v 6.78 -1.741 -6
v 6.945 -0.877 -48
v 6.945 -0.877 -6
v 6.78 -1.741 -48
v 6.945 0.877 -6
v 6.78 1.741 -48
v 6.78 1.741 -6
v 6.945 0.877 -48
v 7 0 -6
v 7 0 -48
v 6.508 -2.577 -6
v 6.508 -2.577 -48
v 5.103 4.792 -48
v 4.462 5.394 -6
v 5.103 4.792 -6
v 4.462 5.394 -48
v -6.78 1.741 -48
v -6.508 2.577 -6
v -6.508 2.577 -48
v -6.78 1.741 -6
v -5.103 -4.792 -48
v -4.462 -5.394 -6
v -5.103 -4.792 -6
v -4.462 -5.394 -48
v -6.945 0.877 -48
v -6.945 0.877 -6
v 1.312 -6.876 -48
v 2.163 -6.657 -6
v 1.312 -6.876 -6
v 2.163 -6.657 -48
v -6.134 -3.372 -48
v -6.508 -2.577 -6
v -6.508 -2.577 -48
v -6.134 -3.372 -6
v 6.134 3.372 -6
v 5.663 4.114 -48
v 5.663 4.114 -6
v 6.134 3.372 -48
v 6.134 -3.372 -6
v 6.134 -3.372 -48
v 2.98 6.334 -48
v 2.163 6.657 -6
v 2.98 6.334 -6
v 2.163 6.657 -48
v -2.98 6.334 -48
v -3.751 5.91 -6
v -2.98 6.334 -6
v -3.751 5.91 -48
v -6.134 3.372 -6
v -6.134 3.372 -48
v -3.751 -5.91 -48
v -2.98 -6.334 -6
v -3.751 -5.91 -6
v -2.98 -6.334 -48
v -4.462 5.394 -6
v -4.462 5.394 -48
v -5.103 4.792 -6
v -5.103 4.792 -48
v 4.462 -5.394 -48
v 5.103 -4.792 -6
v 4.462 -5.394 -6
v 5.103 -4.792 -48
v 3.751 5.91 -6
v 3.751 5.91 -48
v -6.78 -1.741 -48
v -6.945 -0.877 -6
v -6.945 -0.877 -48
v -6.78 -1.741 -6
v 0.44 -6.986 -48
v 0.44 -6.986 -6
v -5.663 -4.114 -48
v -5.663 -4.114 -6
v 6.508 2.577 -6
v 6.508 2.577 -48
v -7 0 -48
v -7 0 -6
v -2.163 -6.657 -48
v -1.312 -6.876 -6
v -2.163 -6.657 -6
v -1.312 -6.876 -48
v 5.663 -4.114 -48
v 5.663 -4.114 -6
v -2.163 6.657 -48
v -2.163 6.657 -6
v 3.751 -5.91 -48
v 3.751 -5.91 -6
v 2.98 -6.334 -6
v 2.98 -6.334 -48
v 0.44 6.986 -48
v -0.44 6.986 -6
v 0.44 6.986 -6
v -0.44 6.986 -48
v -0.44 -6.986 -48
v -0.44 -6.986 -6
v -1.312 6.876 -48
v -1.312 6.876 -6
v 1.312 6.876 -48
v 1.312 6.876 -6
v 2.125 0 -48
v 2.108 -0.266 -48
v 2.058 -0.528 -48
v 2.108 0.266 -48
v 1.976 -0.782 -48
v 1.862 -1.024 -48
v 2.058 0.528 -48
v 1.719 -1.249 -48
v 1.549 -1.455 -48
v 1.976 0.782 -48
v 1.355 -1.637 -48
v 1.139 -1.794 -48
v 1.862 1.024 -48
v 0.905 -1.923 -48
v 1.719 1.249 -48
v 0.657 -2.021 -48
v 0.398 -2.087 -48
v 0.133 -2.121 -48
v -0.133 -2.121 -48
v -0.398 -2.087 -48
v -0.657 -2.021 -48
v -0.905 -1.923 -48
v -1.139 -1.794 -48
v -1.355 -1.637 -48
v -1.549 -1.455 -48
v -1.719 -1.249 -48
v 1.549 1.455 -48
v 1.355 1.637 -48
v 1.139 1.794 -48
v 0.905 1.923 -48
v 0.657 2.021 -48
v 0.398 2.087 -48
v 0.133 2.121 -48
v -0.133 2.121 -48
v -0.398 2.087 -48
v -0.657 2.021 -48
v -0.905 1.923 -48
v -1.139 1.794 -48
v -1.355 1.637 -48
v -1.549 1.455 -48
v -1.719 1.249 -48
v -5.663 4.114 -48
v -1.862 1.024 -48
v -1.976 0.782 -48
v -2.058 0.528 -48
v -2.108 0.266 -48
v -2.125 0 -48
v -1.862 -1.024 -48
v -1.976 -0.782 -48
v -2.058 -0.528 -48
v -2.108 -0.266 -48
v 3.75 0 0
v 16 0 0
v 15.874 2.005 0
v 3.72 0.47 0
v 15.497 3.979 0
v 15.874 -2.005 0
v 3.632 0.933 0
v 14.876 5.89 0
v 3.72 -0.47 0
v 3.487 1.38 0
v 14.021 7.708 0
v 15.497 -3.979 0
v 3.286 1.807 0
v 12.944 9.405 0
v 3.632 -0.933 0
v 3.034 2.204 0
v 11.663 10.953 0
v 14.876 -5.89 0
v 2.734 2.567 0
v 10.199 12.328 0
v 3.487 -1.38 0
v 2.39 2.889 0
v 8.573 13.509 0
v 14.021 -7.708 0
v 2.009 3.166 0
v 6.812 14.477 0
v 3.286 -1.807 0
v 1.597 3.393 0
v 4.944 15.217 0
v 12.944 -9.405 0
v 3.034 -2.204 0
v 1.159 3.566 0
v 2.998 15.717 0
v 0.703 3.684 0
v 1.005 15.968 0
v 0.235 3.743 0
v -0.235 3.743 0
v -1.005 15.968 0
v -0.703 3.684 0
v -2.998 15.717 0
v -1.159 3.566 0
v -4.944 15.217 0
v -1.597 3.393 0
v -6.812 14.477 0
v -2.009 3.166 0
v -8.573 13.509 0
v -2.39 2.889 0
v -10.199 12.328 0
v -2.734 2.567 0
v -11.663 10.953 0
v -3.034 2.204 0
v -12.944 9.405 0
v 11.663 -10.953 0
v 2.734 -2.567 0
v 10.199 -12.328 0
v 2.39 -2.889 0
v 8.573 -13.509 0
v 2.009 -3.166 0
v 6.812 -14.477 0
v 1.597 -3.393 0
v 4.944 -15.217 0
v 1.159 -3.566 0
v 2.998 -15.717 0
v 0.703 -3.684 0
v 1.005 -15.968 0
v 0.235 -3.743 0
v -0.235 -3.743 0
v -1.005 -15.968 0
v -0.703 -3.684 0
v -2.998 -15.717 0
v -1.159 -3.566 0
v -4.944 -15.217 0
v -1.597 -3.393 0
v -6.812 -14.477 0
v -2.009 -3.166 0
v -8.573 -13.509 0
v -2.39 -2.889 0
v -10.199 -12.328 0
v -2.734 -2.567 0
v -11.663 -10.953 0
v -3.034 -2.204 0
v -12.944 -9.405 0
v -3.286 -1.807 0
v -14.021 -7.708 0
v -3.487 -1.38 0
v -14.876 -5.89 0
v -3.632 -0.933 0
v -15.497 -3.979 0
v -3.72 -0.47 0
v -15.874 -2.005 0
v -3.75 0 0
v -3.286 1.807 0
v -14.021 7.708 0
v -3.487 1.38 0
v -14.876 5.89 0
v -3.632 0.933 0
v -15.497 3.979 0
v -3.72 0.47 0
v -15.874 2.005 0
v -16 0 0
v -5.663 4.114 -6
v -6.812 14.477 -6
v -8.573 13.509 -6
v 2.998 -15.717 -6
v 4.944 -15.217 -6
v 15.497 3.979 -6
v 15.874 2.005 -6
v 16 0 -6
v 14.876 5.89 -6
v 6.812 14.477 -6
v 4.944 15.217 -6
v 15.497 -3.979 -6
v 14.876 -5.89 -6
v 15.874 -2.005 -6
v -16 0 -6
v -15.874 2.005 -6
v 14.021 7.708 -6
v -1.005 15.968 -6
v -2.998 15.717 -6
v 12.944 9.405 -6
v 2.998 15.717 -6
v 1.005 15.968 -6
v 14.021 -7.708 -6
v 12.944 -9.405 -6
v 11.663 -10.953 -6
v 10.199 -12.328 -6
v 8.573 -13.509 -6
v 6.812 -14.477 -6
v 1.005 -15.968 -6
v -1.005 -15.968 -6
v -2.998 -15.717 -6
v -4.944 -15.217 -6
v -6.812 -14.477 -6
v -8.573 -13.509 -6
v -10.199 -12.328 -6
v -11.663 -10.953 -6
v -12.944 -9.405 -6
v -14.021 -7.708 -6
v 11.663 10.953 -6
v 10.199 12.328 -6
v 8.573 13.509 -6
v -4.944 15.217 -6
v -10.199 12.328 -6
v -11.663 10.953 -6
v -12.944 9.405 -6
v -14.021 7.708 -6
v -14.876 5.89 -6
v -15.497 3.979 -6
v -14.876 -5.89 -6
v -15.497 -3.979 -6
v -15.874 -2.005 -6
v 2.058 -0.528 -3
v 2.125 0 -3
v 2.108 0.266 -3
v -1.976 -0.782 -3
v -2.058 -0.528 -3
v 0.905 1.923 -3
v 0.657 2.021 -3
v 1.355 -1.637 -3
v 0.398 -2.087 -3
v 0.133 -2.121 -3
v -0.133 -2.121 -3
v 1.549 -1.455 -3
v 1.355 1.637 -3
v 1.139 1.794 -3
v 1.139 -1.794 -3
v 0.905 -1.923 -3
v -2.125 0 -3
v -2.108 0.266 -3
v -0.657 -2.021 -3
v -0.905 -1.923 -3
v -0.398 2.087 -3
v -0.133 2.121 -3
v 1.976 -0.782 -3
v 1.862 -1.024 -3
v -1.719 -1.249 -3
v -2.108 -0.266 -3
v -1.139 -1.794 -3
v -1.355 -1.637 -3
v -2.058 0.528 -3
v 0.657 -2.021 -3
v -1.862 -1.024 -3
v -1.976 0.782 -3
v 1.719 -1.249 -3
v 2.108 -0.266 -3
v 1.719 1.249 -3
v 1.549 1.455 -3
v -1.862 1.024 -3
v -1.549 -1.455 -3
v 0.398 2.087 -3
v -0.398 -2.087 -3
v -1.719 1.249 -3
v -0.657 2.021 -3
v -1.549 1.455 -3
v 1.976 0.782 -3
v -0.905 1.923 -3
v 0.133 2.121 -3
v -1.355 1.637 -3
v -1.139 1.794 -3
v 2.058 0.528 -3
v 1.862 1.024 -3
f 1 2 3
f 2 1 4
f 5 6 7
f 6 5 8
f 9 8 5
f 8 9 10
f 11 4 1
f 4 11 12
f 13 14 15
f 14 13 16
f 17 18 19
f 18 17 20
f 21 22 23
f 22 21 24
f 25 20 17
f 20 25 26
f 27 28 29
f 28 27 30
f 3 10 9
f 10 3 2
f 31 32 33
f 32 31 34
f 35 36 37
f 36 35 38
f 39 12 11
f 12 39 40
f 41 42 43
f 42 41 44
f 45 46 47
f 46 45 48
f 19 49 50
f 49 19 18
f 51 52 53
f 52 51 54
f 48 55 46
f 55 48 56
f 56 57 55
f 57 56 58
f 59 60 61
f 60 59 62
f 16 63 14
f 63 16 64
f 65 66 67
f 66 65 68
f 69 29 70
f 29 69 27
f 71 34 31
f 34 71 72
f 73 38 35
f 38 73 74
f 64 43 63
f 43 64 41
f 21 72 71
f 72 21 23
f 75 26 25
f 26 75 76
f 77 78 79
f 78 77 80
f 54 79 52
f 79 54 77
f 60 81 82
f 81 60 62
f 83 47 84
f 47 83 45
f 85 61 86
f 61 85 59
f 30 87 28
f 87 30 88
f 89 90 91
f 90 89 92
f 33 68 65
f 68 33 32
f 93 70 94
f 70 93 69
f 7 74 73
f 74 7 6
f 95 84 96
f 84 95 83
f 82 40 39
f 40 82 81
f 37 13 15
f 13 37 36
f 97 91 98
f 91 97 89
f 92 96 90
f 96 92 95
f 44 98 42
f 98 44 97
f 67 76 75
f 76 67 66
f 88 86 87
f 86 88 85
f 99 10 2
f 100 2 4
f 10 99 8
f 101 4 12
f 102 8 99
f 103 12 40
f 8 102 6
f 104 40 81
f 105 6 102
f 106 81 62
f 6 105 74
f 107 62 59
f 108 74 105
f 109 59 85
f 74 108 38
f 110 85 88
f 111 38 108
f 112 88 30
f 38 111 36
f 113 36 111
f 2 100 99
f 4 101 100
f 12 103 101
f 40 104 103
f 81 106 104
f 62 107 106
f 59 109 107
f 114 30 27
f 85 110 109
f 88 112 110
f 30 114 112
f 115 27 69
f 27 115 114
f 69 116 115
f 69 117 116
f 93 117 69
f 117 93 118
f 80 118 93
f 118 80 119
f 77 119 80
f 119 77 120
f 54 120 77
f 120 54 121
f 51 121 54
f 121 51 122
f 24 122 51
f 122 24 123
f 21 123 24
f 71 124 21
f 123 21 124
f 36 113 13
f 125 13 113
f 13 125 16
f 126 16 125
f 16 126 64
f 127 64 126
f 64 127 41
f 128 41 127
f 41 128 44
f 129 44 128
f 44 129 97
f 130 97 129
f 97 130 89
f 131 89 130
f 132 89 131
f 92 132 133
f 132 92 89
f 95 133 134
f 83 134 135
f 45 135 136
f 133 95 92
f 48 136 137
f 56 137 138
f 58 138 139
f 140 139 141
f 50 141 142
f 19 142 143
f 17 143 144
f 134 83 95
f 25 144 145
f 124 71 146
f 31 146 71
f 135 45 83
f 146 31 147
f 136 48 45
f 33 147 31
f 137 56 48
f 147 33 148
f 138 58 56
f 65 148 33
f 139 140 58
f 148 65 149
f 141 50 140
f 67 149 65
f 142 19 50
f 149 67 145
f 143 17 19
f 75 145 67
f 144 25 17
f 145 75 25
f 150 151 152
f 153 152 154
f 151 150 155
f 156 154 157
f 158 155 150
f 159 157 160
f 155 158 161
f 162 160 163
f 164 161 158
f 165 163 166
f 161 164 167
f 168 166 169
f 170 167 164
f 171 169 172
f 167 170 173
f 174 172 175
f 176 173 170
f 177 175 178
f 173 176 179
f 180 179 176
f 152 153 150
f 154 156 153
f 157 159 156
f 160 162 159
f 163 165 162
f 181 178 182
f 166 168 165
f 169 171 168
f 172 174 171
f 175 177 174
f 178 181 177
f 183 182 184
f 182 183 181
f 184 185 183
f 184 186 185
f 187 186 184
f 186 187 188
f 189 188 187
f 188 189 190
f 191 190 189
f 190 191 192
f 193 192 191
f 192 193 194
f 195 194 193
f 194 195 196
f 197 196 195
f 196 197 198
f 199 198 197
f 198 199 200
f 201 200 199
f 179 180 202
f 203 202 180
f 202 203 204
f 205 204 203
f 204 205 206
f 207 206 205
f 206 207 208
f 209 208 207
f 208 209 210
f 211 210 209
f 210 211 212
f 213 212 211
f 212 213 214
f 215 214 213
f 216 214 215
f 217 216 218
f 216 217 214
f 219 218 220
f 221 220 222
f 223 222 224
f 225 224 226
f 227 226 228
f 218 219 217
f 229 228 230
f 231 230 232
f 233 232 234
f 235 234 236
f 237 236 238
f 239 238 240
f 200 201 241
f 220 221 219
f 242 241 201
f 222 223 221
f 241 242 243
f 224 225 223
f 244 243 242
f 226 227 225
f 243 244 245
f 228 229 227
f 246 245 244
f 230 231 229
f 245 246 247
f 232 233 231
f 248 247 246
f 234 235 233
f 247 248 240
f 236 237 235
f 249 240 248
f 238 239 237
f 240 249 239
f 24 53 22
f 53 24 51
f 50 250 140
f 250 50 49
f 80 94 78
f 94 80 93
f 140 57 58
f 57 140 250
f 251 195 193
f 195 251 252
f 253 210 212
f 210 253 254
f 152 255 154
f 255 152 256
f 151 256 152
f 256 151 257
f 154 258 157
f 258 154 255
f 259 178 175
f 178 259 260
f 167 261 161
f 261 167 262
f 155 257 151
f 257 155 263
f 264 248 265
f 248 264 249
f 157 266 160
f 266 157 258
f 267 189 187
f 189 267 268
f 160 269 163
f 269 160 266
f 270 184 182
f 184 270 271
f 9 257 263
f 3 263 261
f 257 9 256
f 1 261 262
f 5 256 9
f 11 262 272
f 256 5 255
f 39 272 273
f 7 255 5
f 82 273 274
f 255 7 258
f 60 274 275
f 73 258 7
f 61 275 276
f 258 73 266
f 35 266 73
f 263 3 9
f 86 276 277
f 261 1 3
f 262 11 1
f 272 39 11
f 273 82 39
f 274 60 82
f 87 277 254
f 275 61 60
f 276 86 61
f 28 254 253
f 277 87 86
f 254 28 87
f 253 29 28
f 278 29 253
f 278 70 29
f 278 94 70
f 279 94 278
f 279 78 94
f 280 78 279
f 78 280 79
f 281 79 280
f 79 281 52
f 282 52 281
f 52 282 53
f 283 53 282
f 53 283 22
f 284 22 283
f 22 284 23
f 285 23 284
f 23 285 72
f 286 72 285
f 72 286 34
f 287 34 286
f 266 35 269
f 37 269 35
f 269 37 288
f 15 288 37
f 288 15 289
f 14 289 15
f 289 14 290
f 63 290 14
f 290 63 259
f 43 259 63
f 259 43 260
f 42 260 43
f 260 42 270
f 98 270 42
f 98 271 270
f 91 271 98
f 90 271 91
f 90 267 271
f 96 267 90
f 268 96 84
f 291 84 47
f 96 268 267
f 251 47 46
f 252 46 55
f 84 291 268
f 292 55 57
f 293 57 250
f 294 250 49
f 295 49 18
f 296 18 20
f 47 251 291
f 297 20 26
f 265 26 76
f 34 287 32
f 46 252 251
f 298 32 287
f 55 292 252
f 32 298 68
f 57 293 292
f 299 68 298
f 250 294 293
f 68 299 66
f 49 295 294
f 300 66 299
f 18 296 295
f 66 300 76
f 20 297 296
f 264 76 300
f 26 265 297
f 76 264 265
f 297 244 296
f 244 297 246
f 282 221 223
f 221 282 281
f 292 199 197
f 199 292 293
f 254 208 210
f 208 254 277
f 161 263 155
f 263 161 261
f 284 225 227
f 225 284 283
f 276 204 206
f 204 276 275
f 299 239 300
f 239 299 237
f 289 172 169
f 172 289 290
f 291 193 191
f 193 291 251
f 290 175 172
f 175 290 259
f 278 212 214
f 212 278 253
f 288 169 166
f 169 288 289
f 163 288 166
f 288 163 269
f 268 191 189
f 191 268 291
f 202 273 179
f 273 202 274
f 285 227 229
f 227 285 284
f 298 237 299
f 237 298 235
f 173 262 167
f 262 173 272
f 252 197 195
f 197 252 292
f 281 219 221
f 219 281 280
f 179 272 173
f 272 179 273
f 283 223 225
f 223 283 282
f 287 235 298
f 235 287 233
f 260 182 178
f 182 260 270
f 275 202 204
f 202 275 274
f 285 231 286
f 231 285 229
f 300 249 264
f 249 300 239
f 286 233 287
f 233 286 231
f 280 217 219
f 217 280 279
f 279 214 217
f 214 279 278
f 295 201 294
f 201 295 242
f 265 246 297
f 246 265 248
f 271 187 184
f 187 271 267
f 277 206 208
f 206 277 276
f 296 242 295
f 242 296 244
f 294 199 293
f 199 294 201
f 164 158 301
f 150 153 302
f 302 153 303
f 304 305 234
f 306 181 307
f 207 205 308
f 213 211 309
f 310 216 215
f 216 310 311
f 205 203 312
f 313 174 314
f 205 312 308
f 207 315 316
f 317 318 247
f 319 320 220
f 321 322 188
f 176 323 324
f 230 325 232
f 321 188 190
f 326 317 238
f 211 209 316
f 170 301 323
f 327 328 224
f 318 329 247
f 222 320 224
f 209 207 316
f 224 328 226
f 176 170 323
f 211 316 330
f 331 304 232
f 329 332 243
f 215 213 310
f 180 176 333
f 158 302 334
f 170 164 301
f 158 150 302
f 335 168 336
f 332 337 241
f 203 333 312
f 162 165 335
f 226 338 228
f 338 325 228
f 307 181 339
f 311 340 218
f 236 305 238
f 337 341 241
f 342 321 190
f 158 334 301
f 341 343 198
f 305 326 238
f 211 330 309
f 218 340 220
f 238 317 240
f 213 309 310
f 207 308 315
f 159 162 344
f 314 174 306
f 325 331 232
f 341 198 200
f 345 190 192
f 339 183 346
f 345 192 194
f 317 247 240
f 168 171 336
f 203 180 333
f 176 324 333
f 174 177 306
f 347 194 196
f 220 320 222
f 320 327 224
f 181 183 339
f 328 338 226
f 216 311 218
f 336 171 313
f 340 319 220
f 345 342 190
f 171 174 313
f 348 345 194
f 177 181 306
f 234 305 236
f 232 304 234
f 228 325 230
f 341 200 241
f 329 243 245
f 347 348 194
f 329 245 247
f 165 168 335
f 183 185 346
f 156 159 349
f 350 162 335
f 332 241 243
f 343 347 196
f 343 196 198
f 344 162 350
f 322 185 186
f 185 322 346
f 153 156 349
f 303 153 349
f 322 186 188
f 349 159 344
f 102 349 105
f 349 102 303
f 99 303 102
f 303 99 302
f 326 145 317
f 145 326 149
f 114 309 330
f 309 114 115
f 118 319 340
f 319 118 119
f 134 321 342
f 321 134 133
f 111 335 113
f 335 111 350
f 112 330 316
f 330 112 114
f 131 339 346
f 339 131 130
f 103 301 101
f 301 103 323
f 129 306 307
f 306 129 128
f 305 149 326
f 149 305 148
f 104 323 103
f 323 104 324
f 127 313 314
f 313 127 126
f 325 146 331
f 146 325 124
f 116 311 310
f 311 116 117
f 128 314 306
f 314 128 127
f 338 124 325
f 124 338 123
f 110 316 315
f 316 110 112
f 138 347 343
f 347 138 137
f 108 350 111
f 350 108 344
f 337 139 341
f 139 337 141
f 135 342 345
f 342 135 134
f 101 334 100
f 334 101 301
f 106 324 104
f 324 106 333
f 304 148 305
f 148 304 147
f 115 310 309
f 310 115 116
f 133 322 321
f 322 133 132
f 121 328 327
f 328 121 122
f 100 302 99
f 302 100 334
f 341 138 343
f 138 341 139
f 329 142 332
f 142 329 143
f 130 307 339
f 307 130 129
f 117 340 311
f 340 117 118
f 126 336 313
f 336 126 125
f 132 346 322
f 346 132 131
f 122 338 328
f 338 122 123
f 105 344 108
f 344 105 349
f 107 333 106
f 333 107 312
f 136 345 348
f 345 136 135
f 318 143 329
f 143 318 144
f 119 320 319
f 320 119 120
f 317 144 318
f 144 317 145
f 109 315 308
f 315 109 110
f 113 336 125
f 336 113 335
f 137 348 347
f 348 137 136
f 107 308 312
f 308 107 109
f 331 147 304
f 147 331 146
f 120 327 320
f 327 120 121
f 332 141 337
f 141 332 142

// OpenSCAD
$fn = 50;


difference() {
	union() {
		translate(v = [0, 0, -48.0000000000]) {
			cylinder(h = 48, r = 7.0000000000);
		}
		translate(v = [0, 0, -6.0000000000]) {
			cylinder(h = 6, r = 16.0000000000);
		}
	}
	union() {
		translate(v = [0, 0, 0]) {
			rotate(a = [0, 0, 0]) {
				difference() {
					union() {
						#translate(v = [0, 0, -48.0000000000]) {
							cylinder(h = 48, r = 2.0000000000);
						}
						#translate(v = [0, 0, -3]) {
							cylinder(h = 3, r = 7.0000000000, r1 = 2.1250000000, r2 = 3.7500000000);
						}
						#translate(v = [0, 0, -48.0000000000]) {
							cylinder(h = 48, r = 2.1250000000);
						}
						#translate(v = [0, 0, -48.0000000000]) {
							cylinder(h = 48, r = 2.0000000000);
						}
					}
					union();
				}
			}
		}
	}
}
